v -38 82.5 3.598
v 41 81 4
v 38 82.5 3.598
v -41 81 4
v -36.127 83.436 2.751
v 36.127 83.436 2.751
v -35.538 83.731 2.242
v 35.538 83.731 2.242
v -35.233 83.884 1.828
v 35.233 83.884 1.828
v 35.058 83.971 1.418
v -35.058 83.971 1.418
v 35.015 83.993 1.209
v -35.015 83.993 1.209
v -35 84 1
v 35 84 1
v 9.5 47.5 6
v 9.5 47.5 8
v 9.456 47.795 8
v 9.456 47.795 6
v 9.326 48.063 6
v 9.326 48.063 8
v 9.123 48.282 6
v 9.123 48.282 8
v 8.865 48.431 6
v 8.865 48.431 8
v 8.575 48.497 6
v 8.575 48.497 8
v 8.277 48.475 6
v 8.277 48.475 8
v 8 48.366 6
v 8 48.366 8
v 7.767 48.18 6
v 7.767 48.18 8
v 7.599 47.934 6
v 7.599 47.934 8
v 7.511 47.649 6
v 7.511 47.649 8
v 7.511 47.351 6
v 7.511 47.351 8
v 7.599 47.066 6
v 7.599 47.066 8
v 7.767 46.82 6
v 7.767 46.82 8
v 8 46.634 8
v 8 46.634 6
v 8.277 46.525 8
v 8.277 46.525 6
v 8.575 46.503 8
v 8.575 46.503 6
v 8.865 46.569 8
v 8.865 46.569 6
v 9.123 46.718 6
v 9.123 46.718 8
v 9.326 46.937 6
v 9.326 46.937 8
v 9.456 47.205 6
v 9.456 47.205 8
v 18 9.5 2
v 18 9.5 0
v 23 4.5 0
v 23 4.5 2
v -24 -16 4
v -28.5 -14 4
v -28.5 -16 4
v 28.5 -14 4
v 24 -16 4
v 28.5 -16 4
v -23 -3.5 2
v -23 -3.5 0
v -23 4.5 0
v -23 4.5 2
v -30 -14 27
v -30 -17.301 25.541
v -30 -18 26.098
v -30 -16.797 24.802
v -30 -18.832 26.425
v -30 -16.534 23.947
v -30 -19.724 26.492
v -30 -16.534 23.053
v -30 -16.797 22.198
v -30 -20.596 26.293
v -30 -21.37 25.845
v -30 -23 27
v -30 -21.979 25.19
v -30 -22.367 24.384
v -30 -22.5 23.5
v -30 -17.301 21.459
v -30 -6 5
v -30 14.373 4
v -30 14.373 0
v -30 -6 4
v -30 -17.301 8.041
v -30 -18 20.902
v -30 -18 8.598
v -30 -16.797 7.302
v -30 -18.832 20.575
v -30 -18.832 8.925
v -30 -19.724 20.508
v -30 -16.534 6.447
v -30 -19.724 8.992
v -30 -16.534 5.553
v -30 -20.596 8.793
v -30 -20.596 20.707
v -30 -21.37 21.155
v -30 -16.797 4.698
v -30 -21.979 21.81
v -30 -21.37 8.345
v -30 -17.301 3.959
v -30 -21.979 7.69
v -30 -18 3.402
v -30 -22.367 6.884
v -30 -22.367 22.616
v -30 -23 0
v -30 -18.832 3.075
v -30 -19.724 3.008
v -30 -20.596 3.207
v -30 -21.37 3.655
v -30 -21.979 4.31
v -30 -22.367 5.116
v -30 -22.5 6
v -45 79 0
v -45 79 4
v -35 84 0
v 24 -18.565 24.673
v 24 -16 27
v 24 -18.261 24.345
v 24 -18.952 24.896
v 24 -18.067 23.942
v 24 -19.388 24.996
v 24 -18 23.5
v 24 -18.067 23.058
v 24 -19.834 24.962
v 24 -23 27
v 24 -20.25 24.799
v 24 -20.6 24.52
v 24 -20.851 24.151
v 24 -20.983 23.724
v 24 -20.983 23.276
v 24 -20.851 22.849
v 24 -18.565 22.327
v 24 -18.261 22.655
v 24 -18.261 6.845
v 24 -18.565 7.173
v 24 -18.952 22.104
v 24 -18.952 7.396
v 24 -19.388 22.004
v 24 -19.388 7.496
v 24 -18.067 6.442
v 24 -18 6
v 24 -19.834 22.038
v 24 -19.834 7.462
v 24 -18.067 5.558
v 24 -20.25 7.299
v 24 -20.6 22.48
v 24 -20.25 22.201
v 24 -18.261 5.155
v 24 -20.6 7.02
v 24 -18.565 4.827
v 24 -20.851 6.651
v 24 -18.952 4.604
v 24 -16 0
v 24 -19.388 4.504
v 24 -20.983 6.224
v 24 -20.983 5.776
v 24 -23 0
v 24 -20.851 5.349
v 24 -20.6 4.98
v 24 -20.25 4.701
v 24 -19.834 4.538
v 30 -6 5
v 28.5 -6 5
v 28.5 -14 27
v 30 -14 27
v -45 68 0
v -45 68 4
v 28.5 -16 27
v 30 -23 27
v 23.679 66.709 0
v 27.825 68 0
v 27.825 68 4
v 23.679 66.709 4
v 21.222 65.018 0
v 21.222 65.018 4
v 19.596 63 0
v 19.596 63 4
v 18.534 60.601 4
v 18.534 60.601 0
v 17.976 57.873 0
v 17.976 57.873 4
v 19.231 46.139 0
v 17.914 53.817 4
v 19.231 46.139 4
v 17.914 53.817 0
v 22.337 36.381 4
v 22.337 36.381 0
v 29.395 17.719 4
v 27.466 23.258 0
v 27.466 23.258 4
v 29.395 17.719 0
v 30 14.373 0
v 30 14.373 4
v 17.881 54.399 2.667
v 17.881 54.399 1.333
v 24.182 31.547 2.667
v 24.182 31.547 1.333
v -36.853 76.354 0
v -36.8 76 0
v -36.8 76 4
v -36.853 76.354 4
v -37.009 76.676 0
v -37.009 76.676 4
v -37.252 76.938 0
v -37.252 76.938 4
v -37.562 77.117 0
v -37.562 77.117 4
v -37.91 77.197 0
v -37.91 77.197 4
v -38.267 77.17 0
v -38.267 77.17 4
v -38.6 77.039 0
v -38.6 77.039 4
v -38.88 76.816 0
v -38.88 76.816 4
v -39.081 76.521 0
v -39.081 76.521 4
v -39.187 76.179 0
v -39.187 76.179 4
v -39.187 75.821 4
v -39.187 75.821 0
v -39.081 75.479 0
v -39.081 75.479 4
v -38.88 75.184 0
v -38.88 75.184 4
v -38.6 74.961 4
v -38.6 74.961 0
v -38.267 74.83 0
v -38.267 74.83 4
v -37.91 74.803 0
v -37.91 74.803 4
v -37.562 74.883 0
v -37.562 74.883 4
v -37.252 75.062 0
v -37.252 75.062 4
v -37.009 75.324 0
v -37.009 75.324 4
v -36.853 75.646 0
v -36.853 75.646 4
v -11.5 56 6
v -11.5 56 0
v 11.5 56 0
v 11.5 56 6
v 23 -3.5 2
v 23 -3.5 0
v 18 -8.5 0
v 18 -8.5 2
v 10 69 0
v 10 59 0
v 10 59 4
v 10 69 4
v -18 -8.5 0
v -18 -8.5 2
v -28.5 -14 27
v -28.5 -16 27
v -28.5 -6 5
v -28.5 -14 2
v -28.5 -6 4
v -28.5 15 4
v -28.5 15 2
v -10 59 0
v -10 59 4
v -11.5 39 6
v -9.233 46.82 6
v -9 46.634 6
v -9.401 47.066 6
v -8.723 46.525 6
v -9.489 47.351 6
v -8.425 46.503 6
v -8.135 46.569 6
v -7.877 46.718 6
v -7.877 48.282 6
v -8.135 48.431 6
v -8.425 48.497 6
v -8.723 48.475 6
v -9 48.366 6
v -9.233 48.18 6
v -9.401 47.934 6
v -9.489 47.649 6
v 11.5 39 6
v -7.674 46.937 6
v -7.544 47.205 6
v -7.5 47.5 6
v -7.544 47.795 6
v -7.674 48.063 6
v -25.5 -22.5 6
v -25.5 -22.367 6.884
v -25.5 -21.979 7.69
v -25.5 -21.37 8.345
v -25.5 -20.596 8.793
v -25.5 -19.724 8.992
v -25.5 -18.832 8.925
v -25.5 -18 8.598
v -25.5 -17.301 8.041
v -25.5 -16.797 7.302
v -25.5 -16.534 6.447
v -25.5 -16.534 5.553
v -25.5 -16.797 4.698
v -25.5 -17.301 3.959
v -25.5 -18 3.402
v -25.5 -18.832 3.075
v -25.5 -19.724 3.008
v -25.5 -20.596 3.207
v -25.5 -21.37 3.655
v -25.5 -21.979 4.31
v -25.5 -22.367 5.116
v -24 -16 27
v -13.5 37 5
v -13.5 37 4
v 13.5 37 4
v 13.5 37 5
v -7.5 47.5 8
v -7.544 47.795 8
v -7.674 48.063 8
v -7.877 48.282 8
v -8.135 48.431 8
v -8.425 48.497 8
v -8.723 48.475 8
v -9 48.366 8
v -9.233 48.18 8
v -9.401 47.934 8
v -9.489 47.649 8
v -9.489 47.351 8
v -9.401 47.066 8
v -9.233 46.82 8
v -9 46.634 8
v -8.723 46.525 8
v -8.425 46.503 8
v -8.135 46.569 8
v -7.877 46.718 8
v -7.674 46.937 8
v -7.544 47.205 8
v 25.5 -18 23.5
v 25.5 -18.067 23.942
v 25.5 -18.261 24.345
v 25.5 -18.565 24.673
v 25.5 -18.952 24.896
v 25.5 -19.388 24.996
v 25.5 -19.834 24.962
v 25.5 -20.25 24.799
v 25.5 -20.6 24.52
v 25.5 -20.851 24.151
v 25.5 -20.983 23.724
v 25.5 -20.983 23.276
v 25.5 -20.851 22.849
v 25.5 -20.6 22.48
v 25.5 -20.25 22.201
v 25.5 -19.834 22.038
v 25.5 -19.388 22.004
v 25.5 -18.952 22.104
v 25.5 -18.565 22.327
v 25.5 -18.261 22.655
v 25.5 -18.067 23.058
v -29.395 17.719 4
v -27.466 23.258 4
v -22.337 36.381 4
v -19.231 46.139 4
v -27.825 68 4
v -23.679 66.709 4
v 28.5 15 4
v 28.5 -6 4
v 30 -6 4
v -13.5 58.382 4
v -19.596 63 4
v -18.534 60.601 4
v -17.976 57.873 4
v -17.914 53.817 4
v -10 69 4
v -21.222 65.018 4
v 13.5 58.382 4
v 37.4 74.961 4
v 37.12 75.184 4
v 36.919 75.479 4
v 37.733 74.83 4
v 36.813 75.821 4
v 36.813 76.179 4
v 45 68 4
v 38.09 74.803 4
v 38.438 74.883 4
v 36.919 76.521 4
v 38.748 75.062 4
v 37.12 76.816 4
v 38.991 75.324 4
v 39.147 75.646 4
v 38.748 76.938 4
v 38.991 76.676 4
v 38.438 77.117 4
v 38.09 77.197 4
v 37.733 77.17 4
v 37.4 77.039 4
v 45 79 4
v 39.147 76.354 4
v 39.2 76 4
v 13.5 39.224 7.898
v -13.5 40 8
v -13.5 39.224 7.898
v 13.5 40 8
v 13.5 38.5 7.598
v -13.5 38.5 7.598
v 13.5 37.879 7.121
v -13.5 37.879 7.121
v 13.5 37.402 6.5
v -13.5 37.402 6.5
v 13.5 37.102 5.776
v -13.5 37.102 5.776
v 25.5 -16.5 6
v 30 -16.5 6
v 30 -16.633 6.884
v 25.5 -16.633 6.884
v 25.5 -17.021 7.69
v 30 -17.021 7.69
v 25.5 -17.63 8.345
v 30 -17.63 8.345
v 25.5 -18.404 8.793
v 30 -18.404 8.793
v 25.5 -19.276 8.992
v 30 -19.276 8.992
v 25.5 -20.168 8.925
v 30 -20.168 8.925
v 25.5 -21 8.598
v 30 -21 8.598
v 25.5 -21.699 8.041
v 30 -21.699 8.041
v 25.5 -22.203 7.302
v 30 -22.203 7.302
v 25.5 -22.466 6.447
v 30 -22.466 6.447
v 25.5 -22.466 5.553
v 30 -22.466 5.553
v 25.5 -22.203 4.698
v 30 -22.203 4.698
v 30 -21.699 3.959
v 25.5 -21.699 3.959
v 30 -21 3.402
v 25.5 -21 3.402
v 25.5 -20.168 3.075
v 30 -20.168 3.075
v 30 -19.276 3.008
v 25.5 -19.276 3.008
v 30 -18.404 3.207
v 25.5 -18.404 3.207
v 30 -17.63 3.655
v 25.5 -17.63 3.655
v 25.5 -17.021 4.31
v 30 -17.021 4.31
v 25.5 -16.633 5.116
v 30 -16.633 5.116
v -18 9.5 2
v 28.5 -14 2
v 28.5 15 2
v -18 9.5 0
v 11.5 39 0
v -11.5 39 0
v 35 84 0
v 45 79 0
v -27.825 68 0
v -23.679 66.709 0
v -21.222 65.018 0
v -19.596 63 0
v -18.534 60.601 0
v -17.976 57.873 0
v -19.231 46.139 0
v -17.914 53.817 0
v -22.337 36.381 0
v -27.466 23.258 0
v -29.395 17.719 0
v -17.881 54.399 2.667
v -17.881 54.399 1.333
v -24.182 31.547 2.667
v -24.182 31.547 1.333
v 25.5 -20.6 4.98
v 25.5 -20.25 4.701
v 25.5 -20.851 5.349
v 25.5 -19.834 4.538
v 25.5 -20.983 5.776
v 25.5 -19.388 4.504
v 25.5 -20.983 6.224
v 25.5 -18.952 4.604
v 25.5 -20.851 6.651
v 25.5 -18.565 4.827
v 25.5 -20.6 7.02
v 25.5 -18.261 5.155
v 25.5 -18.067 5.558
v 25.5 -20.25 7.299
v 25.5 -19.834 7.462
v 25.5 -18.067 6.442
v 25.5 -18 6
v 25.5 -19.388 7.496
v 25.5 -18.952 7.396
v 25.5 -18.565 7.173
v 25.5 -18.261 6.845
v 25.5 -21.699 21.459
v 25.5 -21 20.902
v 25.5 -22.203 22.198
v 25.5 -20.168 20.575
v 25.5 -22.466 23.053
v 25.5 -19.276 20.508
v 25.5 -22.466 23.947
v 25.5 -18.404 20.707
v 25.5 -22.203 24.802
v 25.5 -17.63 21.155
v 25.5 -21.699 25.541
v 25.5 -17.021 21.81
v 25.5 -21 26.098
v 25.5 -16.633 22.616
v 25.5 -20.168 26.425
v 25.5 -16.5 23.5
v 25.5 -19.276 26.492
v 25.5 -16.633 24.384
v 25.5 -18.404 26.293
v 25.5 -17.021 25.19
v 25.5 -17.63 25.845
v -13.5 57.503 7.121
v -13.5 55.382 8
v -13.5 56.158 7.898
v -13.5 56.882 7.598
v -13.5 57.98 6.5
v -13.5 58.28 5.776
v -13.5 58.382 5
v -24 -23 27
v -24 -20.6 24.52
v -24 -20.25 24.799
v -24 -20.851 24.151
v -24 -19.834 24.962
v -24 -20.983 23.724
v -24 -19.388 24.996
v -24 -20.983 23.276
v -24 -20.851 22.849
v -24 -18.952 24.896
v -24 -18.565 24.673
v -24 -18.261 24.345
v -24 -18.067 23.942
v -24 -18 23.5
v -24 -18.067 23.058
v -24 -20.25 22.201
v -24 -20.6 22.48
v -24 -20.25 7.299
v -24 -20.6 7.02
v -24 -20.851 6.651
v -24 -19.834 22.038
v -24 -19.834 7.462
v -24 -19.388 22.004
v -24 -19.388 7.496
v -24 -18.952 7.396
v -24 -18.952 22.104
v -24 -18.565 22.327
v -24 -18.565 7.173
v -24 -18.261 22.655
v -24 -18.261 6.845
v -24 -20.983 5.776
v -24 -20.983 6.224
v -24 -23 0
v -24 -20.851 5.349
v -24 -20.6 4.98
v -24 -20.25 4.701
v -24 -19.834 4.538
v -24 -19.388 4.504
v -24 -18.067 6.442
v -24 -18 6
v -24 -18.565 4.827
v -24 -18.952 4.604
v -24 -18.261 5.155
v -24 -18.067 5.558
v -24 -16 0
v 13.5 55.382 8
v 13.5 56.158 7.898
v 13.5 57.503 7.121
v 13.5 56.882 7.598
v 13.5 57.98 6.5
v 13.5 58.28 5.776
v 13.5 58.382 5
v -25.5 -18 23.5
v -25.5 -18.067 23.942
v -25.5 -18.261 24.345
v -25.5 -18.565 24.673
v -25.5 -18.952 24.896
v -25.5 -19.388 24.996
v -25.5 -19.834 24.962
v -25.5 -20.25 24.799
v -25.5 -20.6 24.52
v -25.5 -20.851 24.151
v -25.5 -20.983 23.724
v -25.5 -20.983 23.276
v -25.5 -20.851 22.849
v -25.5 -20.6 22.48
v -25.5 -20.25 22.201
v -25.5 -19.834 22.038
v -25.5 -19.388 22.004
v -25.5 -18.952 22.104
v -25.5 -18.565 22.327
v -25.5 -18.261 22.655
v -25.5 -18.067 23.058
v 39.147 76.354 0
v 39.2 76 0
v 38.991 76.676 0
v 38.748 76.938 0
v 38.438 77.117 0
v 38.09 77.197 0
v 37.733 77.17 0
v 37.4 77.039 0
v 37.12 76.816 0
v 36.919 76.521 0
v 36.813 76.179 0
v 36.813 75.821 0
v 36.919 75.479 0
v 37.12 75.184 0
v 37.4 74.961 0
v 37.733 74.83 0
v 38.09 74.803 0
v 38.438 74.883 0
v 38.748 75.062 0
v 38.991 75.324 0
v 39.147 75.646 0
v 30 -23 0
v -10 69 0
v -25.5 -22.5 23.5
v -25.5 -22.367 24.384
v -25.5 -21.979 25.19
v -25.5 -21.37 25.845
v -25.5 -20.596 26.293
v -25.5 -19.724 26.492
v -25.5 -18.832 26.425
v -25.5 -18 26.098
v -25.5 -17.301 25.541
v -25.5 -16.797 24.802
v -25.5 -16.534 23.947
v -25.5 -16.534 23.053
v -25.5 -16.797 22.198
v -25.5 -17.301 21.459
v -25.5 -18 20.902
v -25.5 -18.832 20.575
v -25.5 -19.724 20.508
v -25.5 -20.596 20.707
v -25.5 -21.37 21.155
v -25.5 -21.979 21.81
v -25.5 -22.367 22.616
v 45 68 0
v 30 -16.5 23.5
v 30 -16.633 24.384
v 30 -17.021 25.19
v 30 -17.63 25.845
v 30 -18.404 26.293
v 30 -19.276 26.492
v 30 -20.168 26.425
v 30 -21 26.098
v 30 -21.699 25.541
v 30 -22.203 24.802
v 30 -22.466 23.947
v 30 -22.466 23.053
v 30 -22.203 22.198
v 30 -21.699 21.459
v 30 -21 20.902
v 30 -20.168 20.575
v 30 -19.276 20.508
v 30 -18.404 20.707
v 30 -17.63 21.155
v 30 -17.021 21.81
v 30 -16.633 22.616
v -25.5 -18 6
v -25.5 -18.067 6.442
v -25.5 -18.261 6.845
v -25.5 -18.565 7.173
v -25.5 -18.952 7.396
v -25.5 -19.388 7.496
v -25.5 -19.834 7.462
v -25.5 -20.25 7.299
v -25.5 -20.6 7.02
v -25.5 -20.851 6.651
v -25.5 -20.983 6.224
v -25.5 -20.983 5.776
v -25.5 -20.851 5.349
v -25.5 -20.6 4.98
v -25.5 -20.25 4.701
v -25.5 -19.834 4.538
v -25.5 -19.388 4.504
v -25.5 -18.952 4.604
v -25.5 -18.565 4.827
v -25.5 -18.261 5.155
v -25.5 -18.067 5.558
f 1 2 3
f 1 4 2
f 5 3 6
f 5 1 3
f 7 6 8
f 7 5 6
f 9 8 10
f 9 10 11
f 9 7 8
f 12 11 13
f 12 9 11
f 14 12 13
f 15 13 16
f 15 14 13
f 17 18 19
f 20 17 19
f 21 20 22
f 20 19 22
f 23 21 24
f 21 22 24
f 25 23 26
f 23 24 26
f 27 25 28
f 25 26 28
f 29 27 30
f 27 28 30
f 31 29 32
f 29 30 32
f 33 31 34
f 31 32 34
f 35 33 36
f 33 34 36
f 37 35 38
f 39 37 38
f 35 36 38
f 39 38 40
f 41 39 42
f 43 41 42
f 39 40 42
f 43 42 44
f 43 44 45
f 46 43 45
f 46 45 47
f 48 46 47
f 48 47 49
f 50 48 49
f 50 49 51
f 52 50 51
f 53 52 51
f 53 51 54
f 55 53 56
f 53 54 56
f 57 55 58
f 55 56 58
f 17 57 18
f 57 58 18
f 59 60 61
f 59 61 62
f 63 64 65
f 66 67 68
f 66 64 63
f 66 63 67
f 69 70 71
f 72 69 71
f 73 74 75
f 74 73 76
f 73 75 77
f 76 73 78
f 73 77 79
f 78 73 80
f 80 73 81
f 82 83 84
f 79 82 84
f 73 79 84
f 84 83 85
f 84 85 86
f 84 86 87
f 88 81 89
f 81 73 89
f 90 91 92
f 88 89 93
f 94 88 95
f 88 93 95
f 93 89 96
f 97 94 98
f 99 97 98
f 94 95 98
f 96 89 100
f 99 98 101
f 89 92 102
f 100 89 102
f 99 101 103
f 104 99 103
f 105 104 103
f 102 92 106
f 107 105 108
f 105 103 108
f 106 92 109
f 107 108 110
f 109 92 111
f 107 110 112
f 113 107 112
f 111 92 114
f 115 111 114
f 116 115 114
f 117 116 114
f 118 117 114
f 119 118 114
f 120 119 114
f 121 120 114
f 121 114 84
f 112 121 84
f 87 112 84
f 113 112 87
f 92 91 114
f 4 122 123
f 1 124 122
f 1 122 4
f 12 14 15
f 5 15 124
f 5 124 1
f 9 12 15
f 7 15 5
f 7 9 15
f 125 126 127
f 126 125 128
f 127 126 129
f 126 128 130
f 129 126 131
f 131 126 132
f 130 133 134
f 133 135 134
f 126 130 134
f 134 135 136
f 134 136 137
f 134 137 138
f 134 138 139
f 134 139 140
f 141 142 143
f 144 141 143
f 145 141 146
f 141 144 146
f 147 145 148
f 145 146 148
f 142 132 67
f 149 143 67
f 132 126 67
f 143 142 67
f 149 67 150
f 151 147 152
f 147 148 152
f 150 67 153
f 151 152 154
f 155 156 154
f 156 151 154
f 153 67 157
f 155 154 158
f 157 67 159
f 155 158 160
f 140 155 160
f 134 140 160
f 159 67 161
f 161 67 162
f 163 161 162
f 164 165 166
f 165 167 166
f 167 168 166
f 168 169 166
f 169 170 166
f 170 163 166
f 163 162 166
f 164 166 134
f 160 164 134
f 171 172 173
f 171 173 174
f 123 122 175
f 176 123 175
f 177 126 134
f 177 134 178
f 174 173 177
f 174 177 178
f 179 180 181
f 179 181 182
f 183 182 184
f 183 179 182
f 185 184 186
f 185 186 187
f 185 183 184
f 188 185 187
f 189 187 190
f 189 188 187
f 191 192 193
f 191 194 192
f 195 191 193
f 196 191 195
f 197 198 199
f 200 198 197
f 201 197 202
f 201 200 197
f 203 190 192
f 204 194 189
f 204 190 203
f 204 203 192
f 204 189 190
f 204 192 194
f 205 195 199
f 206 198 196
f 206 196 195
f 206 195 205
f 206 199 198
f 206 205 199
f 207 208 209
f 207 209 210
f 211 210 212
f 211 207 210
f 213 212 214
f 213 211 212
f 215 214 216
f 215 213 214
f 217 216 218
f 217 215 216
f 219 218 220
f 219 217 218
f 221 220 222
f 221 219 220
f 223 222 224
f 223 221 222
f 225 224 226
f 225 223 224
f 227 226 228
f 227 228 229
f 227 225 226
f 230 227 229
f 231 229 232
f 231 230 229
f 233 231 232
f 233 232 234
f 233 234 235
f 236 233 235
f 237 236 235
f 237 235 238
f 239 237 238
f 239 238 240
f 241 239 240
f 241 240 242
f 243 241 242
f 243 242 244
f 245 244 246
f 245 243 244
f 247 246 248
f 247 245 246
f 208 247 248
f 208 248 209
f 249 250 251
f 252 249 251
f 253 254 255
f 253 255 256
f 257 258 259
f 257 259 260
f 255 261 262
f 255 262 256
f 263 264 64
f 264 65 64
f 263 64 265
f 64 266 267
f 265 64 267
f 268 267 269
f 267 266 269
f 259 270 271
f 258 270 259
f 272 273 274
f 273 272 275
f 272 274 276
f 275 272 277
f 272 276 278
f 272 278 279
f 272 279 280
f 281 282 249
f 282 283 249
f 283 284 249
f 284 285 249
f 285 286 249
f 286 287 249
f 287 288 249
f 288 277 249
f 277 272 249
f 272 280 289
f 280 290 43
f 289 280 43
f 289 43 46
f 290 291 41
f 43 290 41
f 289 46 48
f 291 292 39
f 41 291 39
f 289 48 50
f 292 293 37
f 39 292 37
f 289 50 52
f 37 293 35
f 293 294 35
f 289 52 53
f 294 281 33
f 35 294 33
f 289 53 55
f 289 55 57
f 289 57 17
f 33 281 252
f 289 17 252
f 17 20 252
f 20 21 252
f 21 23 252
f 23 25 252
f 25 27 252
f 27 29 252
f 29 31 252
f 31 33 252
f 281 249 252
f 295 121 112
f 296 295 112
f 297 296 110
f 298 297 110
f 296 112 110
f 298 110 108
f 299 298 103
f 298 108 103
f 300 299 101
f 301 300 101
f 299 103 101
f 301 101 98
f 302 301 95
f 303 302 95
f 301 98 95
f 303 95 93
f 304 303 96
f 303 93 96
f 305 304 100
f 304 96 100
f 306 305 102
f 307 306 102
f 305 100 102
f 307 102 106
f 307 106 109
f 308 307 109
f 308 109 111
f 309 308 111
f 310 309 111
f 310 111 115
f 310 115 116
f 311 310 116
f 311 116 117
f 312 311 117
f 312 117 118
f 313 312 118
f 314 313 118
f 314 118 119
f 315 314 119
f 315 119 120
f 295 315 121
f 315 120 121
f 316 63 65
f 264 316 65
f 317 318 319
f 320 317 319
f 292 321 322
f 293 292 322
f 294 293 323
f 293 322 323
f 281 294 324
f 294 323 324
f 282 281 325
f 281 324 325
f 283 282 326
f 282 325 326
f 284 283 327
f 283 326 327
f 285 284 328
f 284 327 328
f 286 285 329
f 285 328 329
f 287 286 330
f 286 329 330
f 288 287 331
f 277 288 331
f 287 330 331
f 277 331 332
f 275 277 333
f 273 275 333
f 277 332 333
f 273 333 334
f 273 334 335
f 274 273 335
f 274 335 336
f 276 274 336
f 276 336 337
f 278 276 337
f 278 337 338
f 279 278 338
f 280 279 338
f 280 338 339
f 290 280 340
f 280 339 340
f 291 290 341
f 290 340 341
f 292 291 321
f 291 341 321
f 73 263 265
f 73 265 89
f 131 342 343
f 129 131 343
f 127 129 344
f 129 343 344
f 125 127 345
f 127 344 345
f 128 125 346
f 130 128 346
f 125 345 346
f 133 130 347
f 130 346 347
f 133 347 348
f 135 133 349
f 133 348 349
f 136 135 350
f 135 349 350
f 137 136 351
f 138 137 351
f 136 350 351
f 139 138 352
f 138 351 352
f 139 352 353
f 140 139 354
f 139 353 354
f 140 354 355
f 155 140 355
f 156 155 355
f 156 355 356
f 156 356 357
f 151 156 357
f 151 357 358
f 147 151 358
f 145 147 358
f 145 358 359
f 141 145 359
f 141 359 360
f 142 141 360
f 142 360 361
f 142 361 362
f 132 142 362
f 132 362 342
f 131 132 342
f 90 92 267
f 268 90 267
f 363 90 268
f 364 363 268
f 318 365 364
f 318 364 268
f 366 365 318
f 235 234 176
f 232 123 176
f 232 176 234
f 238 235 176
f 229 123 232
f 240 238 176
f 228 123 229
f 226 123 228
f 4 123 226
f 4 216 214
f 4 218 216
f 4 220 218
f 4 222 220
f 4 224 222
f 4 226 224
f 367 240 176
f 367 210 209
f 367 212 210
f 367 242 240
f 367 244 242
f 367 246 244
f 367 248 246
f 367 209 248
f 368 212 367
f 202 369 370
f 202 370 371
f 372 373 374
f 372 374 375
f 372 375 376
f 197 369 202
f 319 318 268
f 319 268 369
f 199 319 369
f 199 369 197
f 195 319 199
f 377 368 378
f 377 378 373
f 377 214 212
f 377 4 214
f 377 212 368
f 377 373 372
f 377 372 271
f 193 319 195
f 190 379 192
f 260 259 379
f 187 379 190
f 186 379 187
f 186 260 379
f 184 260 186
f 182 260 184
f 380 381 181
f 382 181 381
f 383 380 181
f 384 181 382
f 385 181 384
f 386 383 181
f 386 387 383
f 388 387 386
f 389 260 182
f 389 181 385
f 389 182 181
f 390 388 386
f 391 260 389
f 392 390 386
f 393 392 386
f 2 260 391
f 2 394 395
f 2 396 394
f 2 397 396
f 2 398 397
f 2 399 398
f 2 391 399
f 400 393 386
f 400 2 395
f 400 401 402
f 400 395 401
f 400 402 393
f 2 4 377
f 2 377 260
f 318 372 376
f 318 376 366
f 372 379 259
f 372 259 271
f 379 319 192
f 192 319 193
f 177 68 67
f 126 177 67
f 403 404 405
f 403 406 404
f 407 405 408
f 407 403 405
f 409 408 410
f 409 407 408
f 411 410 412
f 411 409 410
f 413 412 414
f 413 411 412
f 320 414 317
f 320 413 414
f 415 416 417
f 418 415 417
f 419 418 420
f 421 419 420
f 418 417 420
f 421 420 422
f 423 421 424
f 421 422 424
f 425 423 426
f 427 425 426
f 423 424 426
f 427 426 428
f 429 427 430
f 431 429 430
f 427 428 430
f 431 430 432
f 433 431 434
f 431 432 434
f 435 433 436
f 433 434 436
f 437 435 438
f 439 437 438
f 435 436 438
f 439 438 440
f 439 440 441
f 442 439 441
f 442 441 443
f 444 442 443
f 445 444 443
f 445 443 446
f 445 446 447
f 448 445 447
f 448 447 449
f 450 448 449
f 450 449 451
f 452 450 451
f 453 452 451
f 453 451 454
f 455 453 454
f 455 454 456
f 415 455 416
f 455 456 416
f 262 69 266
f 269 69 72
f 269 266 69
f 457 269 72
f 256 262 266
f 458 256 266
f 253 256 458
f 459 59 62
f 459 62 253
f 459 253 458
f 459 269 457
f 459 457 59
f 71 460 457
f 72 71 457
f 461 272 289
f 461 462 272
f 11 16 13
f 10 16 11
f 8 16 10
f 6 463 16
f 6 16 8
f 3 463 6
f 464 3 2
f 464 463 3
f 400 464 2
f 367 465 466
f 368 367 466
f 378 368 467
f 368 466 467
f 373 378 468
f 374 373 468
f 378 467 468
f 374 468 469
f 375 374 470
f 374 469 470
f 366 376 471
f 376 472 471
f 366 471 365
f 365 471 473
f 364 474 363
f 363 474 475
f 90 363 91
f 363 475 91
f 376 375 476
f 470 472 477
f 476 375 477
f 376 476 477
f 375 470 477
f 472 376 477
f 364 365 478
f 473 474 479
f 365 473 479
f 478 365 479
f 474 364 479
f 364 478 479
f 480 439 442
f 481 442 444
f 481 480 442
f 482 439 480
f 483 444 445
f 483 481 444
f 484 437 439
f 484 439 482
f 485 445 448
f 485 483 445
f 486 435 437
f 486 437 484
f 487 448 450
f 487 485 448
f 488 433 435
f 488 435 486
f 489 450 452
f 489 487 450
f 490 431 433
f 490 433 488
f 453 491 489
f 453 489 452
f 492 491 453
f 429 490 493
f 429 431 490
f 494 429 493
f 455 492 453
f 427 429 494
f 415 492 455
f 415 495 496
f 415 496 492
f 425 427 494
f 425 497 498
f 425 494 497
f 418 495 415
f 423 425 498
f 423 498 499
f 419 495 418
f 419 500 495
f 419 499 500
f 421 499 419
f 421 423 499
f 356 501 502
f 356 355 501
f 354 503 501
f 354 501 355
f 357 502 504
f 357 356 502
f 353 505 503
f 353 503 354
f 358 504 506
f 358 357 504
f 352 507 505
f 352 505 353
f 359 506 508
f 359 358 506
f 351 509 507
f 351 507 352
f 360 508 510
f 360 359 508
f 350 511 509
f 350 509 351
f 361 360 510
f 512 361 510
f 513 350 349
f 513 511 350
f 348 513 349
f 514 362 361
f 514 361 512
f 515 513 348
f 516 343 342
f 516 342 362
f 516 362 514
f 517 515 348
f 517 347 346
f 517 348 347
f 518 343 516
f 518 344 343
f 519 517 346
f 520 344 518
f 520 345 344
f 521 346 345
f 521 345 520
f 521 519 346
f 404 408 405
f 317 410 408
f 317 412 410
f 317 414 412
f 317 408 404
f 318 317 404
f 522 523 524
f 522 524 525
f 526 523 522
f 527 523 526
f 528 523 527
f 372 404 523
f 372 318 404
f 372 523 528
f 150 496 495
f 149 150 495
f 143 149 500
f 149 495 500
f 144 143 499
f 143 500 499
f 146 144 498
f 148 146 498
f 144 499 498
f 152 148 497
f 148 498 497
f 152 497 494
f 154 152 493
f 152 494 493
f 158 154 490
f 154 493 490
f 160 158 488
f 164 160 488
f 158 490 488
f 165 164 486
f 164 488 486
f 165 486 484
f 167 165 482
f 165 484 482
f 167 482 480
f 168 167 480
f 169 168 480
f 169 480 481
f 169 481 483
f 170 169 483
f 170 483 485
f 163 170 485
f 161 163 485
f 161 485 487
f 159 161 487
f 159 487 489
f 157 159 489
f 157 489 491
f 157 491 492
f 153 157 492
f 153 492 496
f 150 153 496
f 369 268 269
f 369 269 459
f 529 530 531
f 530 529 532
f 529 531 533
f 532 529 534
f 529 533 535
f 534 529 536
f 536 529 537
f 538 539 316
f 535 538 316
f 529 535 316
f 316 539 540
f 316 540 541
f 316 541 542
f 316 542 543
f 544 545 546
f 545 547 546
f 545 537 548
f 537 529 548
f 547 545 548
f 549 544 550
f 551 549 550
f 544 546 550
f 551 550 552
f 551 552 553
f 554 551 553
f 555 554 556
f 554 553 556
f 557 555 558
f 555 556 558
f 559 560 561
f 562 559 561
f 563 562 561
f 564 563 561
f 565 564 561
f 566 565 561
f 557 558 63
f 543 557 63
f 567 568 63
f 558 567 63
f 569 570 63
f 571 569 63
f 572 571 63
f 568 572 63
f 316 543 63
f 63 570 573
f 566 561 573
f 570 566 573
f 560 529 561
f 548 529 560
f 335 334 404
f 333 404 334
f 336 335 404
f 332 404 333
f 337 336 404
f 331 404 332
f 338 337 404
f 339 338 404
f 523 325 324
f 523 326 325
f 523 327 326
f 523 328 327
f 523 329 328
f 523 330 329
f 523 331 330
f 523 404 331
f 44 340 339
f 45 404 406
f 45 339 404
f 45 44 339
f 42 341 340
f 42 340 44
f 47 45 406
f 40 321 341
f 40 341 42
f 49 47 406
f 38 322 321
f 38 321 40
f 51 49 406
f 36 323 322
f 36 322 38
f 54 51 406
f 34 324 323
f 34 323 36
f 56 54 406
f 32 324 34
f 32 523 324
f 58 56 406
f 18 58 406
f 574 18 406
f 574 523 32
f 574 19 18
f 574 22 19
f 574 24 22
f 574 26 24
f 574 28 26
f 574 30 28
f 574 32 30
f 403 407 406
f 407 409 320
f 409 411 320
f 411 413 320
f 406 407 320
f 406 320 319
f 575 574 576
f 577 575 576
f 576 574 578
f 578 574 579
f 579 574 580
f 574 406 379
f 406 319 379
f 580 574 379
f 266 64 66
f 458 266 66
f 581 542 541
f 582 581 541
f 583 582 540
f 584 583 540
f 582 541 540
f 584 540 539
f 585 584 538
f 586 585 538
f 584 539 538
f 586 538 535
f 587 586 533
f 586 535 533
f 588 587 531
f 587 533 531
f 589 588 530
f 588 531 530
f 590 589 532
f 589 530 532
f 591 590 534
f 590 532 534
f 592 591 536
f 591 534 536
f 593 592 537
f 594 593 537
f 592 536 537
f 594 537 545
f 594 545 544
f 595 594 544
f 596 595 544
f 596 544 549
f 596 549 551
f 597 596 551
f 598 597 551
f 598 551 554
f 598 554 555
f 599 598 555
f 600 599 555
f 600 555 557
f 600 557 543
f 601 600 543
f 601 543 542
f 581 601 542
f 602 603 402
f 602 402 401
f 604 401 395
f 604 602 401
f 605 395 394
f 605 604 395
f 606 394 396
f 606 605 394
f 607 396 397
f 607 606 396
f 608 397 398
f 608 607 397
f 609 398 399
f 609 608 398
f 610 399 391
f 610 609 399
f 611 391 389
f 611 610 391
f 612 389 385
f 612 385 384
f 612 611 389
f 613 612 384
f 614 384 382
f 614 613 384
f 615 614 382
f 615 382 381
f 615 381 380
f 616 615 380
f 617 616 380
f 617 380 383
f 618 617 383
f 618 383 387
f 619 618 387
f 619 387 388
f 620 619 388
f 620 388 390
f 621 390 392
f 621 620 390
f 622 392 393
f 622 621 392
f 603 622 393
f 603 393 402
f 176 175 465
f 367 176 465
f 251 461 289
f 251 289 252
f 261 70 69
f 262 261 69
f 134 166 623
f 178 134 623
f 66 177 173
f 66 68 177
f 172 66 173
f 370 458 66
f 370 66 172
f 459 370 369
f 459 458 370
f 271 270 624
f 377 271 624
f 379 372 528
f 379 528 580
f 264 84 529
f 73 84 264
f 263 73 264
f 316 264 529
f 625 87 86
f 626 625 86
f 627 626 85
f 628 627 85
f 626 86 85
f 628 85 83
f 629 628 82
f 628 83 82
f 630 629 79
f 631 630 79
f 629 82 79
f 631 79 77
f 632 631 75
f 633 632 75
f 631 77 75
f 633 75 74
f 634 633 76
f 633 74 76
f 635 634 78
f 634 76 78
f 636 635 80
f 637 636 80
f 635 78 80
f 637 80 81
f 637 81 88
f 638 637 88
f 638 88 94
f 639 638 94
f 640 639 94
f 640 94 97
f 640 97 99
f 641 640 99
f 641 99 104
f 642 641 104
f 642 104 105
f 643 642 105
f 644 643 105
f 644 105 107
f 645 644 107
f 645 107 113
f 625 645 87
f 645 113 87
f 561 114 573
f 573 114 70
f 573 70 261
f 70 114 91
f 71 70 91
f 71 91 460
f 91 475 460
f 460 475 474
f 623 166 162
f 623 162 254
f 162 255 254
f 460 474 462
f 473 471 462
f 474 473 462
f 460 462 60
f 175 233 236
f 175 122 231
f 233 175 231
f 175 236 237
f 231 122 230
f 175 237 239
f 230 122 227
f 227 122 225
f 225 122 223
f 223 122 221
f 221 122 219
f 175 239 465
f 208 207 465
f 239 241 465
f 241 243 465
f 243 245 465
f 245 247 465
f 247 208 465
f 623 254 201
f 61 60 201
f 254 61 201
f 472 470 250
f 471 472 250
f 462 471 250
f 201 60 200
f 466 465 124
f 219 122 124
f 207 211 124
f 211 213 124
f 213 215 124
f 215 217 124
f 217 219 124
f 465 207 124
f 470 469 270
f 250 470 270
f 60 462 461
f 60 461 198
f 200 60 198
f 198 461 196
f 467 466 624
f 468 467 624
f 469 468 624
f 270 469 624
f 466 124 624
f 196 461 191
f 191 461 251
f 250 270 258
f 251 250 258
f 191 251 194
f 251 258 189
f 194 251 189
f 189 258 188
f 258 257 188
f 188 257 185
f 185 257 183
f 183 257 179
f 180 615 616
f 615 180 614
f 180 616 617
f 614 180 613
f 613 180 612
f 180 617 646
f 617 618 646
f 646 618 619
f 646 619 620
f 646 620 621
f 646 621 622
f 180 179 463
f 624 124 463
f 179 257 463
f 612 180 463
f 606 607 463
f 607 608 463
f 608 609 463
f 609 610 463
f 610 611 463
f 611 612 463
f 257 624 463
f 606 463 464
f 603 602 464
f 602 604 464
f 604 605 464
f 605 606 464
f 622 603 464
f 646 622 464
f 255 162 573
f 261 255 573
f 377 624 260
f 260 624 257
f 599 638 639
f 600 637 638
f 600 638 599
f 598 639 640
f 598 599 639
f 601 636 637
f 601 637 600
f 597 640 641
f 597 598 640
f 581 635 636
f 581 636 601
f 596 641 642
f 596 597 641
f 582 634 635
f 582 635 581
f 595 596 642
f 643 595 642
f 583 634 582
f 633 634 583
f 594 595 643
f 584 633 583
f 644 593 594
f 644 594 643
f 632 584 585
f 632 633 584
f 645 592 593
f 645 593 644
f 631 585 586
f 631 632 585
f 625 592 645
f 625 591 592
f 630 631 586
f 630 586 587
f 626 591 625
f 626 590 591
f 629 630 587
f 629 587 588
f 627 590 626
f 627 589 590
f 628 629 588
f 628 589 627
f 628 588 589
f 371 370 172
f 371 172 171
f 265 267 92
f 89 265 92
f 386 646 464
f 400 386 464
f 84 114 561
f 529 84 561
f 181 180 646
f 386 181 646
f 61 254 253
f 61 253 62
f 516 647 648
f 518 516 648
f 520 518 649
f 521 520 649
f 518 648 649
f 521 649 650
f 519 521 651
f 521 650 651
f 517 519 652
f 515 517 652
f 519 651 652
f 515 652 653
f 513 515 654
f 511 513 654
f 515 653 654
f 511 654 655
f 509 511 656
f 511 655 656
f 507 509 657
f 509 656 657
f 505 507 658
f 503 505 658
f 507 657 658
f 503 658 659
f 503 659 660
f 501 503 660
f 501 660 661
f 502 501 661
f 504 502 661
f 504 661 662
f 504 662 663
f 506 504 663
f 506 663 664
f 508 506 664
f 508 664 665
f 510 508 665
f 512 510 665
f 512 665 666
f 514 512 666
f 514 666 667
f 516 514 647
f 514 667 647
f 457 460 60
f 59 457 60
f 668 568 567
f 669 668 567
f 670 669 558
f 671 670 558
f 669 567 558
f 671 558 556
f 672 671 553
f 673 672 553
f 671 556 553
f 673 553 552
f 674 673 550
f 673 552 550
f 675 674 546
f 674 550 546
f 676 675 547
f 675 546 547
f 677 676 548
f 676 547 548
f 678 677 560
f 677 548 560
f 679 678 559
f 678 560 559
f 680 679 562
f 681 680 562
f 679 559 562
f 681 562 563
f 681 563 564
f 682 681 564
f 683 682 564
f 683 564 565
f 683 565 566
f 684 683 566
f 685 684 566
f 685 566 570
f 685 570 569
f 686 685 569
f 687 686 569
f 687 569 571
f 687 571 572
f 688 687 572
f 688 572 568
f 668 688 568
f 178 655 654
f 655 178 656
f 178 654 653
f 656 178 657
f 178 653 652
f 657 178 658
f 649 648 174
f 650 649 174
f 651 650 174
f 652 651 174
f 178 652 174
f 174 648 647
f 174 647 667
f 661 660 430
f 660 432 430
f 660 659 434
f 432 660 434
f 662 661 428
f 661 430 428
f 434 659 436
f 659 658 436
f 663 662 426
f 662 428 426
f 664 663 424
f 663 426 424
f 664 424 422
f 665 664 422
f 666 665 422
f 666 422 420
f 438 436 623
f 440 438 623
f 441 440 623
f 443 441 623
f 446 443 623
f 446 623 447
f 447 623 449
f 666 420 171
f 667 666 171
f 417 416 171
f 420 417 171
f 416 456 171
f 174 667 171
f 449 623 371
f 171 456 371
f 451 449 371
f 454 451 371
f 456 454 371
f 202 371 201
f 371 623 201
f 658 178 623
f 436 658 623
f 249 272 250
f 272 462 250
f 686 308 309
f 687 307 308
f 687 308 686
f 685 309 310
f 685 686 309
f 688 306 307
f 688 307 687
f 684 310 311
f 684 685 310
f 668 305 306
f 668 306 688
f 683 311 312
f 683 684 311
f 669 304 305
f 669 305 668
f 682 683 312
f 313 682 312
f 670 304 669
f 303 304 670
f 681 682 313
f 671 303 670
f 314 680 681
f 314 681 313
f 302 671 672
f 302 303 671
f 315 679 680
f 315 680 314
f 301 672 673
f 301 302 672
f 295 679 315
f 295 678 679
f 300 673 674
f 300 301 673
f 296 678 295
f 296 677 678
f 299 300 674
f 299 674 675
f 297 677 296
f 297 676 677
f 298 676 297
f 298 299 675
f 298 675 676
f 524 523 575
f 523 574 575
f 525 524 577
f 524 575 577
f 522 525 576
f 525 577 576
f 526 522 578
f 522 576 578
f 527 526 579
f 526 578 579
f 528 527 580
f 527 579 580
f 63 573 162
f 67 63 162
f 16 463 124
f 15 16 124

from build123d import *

# Parameters (mm, degrees)
F0_W      = 46
F0_H      = 18
F0_R      = 1.2
F0_W_2    = 23
F0_H_2    = 17
F0_W_3    = 20
F0_H_3    = 10
F1_DEPTH  = 4
F2_SIZE2  = 5
F2_SIZE   = 10
F3_SIZE2  = 10
F3_SIZE   = 5
F4_SIZE   = 5
F5_W      = 1.5
F5_H      = 10
F6_DEPTH  = 27
F7_R      = 1.5
F8_DEPTH  = 60
F9_R      = 3
F10_DEPTH = 4.5
F11_R     = 3
F12_DEPTH = 4.5
F13_W     = 57
F13_H     = 29
F14_DEPTH = 2
F15_SIZE2 = 22
F15_SIZE  = 8
F16_SIZE2 = 8
F16_SIZE  = 22
F17_W     = 27
F17_H     = 21.3817437291
F17_W_2   = 23
F17_H_2   = 17
F18_DEPTH = 2
F19_W     = 27
F19_H     = 21.3817437291
F20_DEPTH = 2
F21_R     = 1
F22_DEPTH = 2
F23_R     = 3


with BuildPart() as f1:
    # F0 (on Top) → F1 (new body)
    with BuildSketch(Plane.XY):
        with BuildLine():
            Line((0, 84), (-45, 84))
            Line((-45, 84), (-45, 68))
            Line((-45, 68), (-30, 68))
            Line((-30, 68), (-27.8254859149, 68))
            add(Edge.make_bspline(
                [(-27.8254859149, 68), (-4.1811005212, 64), (-30, 23.7322062403), (-30, 14.3733293898)],
                knots=[0, 0, 0, 0, 53.6707398145, 53.6707398145, 53.6707398145, 53.6707398145], degree=3))
            Line((-30, 14.3733293898), (-30, -16))
            Line((-30, -16), (0, -16))
            Line((0, -16), (30, -16))
            Line((30, -16), (30, 14.3733293898))
            add(Edge.make_bspline(
                [(27.8254859149, 68), (4.1811005212, 64), (30, 23.7322062403), (30, 14.3733293898)],
                knots=[0, 0, 0, 0, 53.6707398145, 53.6707398145, 53.6707398145, 53.6707398145], degree=3))
            Line((27.8254859149, 68), (30, 68))
            Line((30, 68), (45, 68))
            Line((45, 68), (45, 84))
            Line((45, 84), (0, 84))
        make_face()
        with Locations((0, 0.500412114)):
            Rectangle(F0_W, F0_H, mode=Mode.SUBTRACT)
        with Locations((-38, 76)):
            Circle(F0_R, mode=Mode.SUBTRACT)
        with Locations((0, 47.5)):
            Rectangle(F0_W_2, F0_H_2, mode=Mode.SUBTRACT)
        with Locations((0, 64)):
            Rectangle(F0_W_3, F0_H_3, mode=Mode.SUBTRACT)
        with Locations((38, 76)):
            Circle(F0_R, mode=Mode.SUBTRACT)
    extrude(amount=F1_DEPTH)

    # F2
    f2_edges = [f1.edges().sort_by_distance(p)[0] for p in [
        (45, 84, 2),
    ]]
    f2_side = f1.faces().sort_by_distance((0, 84, 2))[0]
    chamfer(f2_edges, length=F2_SIZE, length2=F2_SIZE2, reference=f2_side)

    # F3
    f3_edges = [f1.edges().sort_by_distance(p)[0] for p in [
        (-45, 84, 2),
    ]]
    f3_side = f1.faces().sort_by_distance((-45, 76, 2))[0]
    chamfer(f3_edges, length=F3_SIZE, length2=F3_SIZE2, reference=f3_side)

    # F4
    f4_edges = [f1.edges().sort_by_distance(p)[0] for p in [
        (-23, 9.500412, 2),
        (23, 9.500412, 2),
        (23, -8.499588, 2),
        (-23, -8.499588, 2),
    ]]
    chamfer(f4_edges, length=F4_SIZE)

    # F5 (on Top) → F6 (join)
    with BuildSketch(Plane.XY):
        Polygon((-24, -16), (-28.5, -16), (-28.5, -6), (-30, -6), (-30, -16), (-30, -23), (-24, -23), align=None)
        Polygon((30, -23), (30, -16), (28.5, -16), (24, -16), (24, -23), align=None)
        with Locations((29.25, -11)):
            Rectangle(F5_W, F5_H)
    extrude(amount=F6_DEPTH)

    # F7 (on face) → F8 (cut)
    with BuildSketch(Plane.YZ.offset(30)):
        with Locations((-19.5, 23.5)):
            Circle(F7_R)
        with Locations((-19.5, 6)):
            Circle(F7_R)
    extrude(amount=-F8_DEPTH, mode=Mode.SUBTRACT)

    # F9 (on face) → F10 (cut)
    with BuildSketch(Plane.YZ.offset(30)):
        with Locations((-19.5, 23.5)):
            Circle(F9_R)
        with Locations((-19.5, 6)):
            Circle(F9_R)
    extrude(amount=-F10_DEPTH, mode=Mode.SUBTRACT)

    # F11 (on face) → F12 (cut)
    with BuildSketch(Plane(origin=(-30, 0, 0), x_dir=(0, -1, 0), z_dir=(-1, 0, 0))):
        with Locations((19.5, 23.5)):
            Circle(F11_R)
        with Locations((19.5, 6)):
            Circle(F11_R)
    extrude(amount=-F12_DEPTH, mode=Mode.SUBTRACT)

    # F13 (on face) → F14 (cut)
    with BuildSketch(Plane.XY.offset(4)):
        with Locations((0, 0.5)):
            Rectangle(F13_W, F13_H)
    extrude(amount=-F14_DEPTH, mode=Mode.SUBTRACT)

    # F15
    f15_edges = [f1.edges().sort_by_distance(p)[0] for p in [
        (29.25, -6, 27),
    ]]
    f15_side = f1.faces().sort_by_distance((27.592105, -17.263158, 27))[0]
    chamfer(f15_edges, length=F15_SIZE, length2=F15_SIZE2, reference=f15_side)

    # F16
    f16_edges = [f1.edges().sort_by_distance(p)[0] for p in [
        (-29.25, -6, 27),
    ]]
    f16_side = f1.faces().sort_by_distance((-29.25, -6, 15.5))[0]
    chamfer(f16_edges, length=F16_SIZE, length2=F16_SIZE2, reference=f16_side)

    # F17 (on face) → F18 (join)
    with BuildSketch(Plane.XY.offset(4)):
        with Locations((0, 47.6908718646)):
            Rectangle(F17_W, F17_H)
        with Locations((0, 47.5)):
            Rectangle(F17_W_2, F17_H_2, mode=Mode.SUBTRACT)
    extrude(amount=F18_DEPTH)

    # F19 (on face) → F20 (join)
    with BuildSketch(Plane.XY.offset(6)):
        with Locations((0, 47.6908718646)):
            Rectangle(F19_W, F19_H)
    extrude(amount=F20_DEPTH)

    # F21 (on face) → F22 (cut)
    with BuildSketch(Plane.XY.offset(8)):
        with Locations((-8.5, 47.5)):
            Circle(F21_R)
        with Locations((8.5, 47.5)):
            Circle(F21_R)
    extrude(amount=-F22_DEPTH, mode=Mode.SUBTRACT)

    # F23
    f23_edges = [f1.edges().sort_by_distance(p)[0] for p in [
        (0, 58.381744, 8),
        (0, 84, 4),
        (0, 37, 8),
    ]]
    fillet(f23_edges, radius=F23_R)


solid = f1.part
